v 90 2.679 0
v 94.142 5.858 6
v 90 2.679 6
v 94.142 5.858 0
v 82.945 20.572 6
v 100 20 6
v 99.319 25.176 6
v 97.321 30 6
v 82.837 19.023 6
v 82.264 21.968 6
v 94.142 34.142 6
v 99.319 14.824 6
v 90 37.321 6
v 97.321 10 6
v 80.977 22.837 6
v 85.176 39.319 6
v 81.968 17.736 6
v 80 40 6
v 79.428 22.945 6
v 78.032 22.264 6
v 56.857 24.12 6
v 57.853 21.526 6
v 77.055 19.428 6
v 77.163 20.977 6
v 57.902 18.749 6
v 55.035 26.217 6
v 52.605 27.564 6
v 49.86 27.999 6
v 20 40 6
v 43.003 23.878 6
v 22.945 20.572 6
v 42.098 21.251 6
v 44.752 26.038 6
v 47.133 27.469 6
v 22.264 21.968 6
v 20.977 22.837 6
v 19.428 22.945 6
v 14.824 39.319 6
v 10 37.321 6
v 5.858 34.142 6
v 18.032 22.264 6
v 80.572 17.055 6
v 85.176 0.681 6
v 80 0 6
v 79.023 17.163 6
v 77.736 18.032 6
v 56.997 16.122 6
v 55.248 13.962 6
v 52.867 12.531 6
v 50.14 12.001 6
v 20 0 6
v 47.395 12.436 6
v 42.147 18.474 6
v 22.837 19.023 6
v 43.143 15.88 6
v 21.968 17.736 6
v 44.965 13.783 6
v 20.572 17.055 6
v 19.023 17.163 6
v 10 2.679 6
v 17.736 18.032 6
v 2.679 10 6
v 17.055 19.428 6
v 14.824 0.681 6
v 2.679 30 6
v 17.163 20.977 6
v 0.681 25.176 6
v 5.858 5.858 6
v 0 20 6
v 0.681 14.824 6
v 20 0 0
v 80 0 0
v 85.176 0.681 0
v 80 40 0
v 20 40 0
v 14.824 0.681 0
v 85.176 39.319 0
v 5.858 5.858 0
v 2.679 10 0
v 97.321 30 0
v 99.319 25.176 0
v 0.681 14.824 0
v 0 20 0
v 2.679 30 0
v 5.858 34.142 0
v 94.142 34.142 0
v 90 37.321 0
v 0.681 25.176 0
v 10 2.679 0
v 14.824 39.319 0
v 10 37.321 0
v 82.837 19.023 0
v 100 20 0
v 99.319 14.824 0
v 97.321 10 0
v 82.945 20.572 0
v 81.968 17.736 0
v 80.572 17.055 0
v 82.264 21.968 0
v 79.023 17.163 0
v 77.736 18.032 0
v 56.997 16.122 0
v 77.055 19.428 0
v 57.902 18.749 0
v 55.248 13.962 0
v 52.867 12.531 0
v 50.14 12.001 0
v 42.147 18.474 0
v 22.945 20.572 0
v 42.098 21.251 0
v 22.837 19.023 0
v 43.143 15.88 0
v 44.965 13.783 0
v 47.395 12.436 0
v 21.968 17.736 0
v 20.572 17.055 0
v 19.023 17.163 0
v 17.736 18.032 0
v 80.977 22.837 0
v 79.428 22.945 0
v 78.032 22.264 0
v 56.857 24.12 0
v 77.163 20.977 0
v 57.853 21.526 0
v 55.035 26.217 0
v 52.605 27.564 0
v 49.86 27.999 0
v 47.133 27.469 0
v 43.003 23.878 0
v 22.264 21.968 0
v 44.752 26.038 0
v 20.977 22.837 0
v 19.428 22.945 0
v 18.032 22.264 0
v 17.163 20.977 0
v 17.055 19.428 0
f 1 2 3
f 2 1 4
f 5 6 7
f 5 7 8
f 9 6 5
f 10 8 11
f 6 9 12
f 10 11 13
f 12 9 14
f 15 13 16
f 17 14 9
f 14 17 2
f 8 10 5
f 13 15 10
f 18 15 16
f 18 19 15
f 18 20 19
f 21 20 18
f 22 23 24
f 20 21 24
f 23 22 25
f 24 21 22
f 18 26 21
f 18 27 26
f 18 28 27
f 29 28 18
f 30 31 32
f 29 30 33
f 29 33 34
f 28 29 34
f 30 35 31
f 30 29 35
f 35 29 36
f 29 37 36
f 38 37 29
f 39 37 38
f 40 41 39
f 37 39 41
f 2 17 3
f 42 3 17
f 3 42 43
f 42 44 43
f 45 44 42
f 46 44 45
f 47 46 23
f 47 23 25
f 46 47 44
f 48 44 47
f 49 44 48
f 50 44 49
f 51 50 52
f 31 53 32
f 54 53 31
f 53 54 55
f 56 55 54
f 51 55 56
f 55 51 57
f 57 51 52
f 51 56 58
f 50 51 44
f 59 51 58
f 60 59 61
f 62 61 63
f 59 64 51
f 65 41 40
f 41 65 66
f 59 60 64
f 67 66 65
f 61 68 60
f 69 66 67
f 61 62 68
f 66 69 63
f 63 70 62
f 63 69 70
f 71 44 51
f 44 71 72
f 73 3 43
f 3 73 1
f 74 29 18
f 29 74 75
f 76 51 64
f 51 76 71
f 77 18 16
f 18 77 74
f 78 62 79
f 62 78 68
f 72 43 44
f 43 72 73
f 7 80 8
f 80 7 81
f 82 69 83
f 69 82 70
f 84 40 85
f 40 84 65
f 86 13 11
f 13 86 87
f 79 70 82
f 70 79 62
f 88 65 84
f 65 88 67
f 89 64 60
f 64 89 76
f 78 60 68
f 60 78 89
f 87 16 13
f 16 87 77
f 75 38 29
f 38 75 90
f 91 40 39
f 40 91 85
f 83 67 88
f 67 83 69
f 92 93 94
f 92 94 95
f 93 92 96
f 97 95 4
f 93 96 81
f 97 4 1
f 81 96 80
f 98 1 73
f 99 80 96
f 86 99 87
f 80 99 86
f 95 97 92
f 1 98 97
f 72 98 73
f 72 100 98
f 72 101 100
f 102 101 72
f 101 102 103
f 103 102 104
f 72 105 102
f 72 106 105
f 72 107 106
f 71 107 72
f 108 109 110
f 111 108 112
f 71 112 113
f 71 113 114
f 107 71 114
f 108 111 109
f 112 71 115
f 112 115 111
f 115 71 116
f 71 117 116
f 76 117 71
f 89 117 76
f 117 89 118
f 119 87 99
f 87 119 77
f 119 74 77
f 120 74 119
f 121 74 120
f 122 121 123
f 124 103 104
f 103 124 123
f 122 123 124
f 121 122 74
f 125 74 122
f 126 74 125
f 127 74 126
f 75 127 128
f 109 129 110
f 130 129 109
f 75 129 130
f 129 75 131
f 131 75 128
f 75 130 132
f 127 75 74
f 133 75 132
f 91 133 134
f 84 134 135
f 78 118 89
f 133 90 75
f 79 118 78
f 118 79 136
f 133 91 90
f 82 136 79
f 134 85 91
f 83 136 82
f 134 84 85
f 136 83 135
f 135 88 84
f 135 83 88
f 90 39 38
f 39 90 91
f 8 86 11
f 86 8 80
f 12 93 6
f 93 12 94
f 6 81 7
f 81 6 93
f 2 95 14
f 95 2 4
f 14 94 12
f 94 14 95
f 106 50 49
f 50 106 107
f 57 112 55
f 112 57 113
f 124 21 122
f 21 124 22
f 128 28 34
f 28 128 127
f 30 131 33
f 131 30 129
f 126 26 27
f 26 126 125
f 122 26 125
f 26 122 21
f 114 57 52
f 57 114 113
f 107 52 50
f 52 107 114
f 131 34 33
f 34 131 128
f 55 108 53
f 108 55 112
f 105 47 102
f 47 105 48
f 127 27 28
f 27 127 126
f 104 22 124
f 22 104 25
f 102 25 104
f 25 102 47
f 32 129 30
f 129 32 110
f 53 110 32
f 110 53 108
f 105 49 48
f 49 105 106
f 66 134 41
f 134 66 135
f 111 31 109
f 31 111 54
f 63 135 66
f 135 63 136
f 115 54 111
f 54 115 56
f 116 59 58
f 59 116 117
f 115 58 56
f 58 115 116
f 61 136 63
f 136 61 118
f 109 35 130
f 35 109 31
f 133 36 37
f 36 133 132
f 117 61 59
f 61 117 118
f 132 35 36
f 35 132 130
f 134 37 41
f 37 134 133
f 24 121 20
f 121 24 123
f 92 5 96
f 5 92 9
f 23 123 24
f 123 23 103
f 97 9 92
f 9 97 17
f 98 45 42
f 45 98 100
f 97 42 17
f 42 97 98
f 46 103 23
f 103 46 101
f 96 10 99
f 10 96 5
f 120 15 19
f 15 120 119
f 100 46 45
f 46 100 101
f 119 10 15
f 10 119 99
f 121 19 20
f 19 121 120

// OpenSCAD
$fn = 32;

// ----------------------------------------------------------------------
// Spacer plate: obround span 60, caps R20
// ----------------------------------------------------------------------

// --- parameters (mm) ---
bore_r = 8;               // centre bore radius
bolt_r = 3;               // bolt hole radius
plate_t = 6;              // plate thickness, Z (extrusion height)
span = 60;                // obround span
cap_r = 20;               // cap radius

profile = [[20, 40], [14.824, 39.319], [10, 37.321], [5.858, 34.142], [2.679, 30], [0.681, 25.176], [0, 20], [0.681, 14.824], [2.679, 10], [5.858, 5.858], [10, 2.679], [14.824, 0.681], [20, 0], [80, 0], [85.176, 0.681], [90, 2.679], [94.142, 5.858], [97.321, 10], [99.319, 14.824], [100, 20], [99.319, 25.176], [97.321, 30], [94.142, 34.142], [90, 37.321], [85.176, 39.319], [80, 40]];  // primary outline, 26 points, counter clockwise
void_1 = [[57.853, 21.526], [56.857, 24.12], [55.035, 26.217], [52.605, 27.564], [49.86, 27.999], [47.133, 27.469], [44.752, 26.038], [43.003, 23.878], [42.098, 21.251], [42.147, 18.474], [43.143, 15.88], [44.965, 13.783], [47.395, 12.436], [50.14, 12.001], [52.867, 12.531], [55.248, 13.962], [56.997, 16.122], [57.902, 18.749]];  // centre bore, 18 points
void_2 = [[22.945, 20.572], [22.264, 21.968], [20.977, 22.837], [19.428, 22.945], [18.032, 22.264], [17.163, 20.977], [17.055, 19.428], [17.736, 18.032], [19.023, 17.163], [20.572, 17.055], [21.968, 17.736], [22.837, 19.023]];  // end hole, 12 points
void_3 = [[82.945, 20.572], [82.264, 21.968], [80.977, 22.837], [79.428, 22.945], [78.032, 22.264], [77.163, 20.977], [77.055, 19.428], [77.736, 18.032], [79.023, 17.163], [80.572, 17.055], [81.968, 17.736], [82.837, 19.023]];  // end hole, 12 points

// --- the one profile operation ---
difference() {
  linear_extrude(height = plate_t) polygon(points = profile);
  translate([0, 0, -1])
    linear_extrude(height = plate_t + 2) polygon(points = void_1);
  translate([0, 0, -1])
    linear_extrude(height = plate_t + 2) polygon(points = void_2);
  translate([0, 0, -1])
    linear_extrude(height = plate_t + 2) polygon(points = void_3);
}
